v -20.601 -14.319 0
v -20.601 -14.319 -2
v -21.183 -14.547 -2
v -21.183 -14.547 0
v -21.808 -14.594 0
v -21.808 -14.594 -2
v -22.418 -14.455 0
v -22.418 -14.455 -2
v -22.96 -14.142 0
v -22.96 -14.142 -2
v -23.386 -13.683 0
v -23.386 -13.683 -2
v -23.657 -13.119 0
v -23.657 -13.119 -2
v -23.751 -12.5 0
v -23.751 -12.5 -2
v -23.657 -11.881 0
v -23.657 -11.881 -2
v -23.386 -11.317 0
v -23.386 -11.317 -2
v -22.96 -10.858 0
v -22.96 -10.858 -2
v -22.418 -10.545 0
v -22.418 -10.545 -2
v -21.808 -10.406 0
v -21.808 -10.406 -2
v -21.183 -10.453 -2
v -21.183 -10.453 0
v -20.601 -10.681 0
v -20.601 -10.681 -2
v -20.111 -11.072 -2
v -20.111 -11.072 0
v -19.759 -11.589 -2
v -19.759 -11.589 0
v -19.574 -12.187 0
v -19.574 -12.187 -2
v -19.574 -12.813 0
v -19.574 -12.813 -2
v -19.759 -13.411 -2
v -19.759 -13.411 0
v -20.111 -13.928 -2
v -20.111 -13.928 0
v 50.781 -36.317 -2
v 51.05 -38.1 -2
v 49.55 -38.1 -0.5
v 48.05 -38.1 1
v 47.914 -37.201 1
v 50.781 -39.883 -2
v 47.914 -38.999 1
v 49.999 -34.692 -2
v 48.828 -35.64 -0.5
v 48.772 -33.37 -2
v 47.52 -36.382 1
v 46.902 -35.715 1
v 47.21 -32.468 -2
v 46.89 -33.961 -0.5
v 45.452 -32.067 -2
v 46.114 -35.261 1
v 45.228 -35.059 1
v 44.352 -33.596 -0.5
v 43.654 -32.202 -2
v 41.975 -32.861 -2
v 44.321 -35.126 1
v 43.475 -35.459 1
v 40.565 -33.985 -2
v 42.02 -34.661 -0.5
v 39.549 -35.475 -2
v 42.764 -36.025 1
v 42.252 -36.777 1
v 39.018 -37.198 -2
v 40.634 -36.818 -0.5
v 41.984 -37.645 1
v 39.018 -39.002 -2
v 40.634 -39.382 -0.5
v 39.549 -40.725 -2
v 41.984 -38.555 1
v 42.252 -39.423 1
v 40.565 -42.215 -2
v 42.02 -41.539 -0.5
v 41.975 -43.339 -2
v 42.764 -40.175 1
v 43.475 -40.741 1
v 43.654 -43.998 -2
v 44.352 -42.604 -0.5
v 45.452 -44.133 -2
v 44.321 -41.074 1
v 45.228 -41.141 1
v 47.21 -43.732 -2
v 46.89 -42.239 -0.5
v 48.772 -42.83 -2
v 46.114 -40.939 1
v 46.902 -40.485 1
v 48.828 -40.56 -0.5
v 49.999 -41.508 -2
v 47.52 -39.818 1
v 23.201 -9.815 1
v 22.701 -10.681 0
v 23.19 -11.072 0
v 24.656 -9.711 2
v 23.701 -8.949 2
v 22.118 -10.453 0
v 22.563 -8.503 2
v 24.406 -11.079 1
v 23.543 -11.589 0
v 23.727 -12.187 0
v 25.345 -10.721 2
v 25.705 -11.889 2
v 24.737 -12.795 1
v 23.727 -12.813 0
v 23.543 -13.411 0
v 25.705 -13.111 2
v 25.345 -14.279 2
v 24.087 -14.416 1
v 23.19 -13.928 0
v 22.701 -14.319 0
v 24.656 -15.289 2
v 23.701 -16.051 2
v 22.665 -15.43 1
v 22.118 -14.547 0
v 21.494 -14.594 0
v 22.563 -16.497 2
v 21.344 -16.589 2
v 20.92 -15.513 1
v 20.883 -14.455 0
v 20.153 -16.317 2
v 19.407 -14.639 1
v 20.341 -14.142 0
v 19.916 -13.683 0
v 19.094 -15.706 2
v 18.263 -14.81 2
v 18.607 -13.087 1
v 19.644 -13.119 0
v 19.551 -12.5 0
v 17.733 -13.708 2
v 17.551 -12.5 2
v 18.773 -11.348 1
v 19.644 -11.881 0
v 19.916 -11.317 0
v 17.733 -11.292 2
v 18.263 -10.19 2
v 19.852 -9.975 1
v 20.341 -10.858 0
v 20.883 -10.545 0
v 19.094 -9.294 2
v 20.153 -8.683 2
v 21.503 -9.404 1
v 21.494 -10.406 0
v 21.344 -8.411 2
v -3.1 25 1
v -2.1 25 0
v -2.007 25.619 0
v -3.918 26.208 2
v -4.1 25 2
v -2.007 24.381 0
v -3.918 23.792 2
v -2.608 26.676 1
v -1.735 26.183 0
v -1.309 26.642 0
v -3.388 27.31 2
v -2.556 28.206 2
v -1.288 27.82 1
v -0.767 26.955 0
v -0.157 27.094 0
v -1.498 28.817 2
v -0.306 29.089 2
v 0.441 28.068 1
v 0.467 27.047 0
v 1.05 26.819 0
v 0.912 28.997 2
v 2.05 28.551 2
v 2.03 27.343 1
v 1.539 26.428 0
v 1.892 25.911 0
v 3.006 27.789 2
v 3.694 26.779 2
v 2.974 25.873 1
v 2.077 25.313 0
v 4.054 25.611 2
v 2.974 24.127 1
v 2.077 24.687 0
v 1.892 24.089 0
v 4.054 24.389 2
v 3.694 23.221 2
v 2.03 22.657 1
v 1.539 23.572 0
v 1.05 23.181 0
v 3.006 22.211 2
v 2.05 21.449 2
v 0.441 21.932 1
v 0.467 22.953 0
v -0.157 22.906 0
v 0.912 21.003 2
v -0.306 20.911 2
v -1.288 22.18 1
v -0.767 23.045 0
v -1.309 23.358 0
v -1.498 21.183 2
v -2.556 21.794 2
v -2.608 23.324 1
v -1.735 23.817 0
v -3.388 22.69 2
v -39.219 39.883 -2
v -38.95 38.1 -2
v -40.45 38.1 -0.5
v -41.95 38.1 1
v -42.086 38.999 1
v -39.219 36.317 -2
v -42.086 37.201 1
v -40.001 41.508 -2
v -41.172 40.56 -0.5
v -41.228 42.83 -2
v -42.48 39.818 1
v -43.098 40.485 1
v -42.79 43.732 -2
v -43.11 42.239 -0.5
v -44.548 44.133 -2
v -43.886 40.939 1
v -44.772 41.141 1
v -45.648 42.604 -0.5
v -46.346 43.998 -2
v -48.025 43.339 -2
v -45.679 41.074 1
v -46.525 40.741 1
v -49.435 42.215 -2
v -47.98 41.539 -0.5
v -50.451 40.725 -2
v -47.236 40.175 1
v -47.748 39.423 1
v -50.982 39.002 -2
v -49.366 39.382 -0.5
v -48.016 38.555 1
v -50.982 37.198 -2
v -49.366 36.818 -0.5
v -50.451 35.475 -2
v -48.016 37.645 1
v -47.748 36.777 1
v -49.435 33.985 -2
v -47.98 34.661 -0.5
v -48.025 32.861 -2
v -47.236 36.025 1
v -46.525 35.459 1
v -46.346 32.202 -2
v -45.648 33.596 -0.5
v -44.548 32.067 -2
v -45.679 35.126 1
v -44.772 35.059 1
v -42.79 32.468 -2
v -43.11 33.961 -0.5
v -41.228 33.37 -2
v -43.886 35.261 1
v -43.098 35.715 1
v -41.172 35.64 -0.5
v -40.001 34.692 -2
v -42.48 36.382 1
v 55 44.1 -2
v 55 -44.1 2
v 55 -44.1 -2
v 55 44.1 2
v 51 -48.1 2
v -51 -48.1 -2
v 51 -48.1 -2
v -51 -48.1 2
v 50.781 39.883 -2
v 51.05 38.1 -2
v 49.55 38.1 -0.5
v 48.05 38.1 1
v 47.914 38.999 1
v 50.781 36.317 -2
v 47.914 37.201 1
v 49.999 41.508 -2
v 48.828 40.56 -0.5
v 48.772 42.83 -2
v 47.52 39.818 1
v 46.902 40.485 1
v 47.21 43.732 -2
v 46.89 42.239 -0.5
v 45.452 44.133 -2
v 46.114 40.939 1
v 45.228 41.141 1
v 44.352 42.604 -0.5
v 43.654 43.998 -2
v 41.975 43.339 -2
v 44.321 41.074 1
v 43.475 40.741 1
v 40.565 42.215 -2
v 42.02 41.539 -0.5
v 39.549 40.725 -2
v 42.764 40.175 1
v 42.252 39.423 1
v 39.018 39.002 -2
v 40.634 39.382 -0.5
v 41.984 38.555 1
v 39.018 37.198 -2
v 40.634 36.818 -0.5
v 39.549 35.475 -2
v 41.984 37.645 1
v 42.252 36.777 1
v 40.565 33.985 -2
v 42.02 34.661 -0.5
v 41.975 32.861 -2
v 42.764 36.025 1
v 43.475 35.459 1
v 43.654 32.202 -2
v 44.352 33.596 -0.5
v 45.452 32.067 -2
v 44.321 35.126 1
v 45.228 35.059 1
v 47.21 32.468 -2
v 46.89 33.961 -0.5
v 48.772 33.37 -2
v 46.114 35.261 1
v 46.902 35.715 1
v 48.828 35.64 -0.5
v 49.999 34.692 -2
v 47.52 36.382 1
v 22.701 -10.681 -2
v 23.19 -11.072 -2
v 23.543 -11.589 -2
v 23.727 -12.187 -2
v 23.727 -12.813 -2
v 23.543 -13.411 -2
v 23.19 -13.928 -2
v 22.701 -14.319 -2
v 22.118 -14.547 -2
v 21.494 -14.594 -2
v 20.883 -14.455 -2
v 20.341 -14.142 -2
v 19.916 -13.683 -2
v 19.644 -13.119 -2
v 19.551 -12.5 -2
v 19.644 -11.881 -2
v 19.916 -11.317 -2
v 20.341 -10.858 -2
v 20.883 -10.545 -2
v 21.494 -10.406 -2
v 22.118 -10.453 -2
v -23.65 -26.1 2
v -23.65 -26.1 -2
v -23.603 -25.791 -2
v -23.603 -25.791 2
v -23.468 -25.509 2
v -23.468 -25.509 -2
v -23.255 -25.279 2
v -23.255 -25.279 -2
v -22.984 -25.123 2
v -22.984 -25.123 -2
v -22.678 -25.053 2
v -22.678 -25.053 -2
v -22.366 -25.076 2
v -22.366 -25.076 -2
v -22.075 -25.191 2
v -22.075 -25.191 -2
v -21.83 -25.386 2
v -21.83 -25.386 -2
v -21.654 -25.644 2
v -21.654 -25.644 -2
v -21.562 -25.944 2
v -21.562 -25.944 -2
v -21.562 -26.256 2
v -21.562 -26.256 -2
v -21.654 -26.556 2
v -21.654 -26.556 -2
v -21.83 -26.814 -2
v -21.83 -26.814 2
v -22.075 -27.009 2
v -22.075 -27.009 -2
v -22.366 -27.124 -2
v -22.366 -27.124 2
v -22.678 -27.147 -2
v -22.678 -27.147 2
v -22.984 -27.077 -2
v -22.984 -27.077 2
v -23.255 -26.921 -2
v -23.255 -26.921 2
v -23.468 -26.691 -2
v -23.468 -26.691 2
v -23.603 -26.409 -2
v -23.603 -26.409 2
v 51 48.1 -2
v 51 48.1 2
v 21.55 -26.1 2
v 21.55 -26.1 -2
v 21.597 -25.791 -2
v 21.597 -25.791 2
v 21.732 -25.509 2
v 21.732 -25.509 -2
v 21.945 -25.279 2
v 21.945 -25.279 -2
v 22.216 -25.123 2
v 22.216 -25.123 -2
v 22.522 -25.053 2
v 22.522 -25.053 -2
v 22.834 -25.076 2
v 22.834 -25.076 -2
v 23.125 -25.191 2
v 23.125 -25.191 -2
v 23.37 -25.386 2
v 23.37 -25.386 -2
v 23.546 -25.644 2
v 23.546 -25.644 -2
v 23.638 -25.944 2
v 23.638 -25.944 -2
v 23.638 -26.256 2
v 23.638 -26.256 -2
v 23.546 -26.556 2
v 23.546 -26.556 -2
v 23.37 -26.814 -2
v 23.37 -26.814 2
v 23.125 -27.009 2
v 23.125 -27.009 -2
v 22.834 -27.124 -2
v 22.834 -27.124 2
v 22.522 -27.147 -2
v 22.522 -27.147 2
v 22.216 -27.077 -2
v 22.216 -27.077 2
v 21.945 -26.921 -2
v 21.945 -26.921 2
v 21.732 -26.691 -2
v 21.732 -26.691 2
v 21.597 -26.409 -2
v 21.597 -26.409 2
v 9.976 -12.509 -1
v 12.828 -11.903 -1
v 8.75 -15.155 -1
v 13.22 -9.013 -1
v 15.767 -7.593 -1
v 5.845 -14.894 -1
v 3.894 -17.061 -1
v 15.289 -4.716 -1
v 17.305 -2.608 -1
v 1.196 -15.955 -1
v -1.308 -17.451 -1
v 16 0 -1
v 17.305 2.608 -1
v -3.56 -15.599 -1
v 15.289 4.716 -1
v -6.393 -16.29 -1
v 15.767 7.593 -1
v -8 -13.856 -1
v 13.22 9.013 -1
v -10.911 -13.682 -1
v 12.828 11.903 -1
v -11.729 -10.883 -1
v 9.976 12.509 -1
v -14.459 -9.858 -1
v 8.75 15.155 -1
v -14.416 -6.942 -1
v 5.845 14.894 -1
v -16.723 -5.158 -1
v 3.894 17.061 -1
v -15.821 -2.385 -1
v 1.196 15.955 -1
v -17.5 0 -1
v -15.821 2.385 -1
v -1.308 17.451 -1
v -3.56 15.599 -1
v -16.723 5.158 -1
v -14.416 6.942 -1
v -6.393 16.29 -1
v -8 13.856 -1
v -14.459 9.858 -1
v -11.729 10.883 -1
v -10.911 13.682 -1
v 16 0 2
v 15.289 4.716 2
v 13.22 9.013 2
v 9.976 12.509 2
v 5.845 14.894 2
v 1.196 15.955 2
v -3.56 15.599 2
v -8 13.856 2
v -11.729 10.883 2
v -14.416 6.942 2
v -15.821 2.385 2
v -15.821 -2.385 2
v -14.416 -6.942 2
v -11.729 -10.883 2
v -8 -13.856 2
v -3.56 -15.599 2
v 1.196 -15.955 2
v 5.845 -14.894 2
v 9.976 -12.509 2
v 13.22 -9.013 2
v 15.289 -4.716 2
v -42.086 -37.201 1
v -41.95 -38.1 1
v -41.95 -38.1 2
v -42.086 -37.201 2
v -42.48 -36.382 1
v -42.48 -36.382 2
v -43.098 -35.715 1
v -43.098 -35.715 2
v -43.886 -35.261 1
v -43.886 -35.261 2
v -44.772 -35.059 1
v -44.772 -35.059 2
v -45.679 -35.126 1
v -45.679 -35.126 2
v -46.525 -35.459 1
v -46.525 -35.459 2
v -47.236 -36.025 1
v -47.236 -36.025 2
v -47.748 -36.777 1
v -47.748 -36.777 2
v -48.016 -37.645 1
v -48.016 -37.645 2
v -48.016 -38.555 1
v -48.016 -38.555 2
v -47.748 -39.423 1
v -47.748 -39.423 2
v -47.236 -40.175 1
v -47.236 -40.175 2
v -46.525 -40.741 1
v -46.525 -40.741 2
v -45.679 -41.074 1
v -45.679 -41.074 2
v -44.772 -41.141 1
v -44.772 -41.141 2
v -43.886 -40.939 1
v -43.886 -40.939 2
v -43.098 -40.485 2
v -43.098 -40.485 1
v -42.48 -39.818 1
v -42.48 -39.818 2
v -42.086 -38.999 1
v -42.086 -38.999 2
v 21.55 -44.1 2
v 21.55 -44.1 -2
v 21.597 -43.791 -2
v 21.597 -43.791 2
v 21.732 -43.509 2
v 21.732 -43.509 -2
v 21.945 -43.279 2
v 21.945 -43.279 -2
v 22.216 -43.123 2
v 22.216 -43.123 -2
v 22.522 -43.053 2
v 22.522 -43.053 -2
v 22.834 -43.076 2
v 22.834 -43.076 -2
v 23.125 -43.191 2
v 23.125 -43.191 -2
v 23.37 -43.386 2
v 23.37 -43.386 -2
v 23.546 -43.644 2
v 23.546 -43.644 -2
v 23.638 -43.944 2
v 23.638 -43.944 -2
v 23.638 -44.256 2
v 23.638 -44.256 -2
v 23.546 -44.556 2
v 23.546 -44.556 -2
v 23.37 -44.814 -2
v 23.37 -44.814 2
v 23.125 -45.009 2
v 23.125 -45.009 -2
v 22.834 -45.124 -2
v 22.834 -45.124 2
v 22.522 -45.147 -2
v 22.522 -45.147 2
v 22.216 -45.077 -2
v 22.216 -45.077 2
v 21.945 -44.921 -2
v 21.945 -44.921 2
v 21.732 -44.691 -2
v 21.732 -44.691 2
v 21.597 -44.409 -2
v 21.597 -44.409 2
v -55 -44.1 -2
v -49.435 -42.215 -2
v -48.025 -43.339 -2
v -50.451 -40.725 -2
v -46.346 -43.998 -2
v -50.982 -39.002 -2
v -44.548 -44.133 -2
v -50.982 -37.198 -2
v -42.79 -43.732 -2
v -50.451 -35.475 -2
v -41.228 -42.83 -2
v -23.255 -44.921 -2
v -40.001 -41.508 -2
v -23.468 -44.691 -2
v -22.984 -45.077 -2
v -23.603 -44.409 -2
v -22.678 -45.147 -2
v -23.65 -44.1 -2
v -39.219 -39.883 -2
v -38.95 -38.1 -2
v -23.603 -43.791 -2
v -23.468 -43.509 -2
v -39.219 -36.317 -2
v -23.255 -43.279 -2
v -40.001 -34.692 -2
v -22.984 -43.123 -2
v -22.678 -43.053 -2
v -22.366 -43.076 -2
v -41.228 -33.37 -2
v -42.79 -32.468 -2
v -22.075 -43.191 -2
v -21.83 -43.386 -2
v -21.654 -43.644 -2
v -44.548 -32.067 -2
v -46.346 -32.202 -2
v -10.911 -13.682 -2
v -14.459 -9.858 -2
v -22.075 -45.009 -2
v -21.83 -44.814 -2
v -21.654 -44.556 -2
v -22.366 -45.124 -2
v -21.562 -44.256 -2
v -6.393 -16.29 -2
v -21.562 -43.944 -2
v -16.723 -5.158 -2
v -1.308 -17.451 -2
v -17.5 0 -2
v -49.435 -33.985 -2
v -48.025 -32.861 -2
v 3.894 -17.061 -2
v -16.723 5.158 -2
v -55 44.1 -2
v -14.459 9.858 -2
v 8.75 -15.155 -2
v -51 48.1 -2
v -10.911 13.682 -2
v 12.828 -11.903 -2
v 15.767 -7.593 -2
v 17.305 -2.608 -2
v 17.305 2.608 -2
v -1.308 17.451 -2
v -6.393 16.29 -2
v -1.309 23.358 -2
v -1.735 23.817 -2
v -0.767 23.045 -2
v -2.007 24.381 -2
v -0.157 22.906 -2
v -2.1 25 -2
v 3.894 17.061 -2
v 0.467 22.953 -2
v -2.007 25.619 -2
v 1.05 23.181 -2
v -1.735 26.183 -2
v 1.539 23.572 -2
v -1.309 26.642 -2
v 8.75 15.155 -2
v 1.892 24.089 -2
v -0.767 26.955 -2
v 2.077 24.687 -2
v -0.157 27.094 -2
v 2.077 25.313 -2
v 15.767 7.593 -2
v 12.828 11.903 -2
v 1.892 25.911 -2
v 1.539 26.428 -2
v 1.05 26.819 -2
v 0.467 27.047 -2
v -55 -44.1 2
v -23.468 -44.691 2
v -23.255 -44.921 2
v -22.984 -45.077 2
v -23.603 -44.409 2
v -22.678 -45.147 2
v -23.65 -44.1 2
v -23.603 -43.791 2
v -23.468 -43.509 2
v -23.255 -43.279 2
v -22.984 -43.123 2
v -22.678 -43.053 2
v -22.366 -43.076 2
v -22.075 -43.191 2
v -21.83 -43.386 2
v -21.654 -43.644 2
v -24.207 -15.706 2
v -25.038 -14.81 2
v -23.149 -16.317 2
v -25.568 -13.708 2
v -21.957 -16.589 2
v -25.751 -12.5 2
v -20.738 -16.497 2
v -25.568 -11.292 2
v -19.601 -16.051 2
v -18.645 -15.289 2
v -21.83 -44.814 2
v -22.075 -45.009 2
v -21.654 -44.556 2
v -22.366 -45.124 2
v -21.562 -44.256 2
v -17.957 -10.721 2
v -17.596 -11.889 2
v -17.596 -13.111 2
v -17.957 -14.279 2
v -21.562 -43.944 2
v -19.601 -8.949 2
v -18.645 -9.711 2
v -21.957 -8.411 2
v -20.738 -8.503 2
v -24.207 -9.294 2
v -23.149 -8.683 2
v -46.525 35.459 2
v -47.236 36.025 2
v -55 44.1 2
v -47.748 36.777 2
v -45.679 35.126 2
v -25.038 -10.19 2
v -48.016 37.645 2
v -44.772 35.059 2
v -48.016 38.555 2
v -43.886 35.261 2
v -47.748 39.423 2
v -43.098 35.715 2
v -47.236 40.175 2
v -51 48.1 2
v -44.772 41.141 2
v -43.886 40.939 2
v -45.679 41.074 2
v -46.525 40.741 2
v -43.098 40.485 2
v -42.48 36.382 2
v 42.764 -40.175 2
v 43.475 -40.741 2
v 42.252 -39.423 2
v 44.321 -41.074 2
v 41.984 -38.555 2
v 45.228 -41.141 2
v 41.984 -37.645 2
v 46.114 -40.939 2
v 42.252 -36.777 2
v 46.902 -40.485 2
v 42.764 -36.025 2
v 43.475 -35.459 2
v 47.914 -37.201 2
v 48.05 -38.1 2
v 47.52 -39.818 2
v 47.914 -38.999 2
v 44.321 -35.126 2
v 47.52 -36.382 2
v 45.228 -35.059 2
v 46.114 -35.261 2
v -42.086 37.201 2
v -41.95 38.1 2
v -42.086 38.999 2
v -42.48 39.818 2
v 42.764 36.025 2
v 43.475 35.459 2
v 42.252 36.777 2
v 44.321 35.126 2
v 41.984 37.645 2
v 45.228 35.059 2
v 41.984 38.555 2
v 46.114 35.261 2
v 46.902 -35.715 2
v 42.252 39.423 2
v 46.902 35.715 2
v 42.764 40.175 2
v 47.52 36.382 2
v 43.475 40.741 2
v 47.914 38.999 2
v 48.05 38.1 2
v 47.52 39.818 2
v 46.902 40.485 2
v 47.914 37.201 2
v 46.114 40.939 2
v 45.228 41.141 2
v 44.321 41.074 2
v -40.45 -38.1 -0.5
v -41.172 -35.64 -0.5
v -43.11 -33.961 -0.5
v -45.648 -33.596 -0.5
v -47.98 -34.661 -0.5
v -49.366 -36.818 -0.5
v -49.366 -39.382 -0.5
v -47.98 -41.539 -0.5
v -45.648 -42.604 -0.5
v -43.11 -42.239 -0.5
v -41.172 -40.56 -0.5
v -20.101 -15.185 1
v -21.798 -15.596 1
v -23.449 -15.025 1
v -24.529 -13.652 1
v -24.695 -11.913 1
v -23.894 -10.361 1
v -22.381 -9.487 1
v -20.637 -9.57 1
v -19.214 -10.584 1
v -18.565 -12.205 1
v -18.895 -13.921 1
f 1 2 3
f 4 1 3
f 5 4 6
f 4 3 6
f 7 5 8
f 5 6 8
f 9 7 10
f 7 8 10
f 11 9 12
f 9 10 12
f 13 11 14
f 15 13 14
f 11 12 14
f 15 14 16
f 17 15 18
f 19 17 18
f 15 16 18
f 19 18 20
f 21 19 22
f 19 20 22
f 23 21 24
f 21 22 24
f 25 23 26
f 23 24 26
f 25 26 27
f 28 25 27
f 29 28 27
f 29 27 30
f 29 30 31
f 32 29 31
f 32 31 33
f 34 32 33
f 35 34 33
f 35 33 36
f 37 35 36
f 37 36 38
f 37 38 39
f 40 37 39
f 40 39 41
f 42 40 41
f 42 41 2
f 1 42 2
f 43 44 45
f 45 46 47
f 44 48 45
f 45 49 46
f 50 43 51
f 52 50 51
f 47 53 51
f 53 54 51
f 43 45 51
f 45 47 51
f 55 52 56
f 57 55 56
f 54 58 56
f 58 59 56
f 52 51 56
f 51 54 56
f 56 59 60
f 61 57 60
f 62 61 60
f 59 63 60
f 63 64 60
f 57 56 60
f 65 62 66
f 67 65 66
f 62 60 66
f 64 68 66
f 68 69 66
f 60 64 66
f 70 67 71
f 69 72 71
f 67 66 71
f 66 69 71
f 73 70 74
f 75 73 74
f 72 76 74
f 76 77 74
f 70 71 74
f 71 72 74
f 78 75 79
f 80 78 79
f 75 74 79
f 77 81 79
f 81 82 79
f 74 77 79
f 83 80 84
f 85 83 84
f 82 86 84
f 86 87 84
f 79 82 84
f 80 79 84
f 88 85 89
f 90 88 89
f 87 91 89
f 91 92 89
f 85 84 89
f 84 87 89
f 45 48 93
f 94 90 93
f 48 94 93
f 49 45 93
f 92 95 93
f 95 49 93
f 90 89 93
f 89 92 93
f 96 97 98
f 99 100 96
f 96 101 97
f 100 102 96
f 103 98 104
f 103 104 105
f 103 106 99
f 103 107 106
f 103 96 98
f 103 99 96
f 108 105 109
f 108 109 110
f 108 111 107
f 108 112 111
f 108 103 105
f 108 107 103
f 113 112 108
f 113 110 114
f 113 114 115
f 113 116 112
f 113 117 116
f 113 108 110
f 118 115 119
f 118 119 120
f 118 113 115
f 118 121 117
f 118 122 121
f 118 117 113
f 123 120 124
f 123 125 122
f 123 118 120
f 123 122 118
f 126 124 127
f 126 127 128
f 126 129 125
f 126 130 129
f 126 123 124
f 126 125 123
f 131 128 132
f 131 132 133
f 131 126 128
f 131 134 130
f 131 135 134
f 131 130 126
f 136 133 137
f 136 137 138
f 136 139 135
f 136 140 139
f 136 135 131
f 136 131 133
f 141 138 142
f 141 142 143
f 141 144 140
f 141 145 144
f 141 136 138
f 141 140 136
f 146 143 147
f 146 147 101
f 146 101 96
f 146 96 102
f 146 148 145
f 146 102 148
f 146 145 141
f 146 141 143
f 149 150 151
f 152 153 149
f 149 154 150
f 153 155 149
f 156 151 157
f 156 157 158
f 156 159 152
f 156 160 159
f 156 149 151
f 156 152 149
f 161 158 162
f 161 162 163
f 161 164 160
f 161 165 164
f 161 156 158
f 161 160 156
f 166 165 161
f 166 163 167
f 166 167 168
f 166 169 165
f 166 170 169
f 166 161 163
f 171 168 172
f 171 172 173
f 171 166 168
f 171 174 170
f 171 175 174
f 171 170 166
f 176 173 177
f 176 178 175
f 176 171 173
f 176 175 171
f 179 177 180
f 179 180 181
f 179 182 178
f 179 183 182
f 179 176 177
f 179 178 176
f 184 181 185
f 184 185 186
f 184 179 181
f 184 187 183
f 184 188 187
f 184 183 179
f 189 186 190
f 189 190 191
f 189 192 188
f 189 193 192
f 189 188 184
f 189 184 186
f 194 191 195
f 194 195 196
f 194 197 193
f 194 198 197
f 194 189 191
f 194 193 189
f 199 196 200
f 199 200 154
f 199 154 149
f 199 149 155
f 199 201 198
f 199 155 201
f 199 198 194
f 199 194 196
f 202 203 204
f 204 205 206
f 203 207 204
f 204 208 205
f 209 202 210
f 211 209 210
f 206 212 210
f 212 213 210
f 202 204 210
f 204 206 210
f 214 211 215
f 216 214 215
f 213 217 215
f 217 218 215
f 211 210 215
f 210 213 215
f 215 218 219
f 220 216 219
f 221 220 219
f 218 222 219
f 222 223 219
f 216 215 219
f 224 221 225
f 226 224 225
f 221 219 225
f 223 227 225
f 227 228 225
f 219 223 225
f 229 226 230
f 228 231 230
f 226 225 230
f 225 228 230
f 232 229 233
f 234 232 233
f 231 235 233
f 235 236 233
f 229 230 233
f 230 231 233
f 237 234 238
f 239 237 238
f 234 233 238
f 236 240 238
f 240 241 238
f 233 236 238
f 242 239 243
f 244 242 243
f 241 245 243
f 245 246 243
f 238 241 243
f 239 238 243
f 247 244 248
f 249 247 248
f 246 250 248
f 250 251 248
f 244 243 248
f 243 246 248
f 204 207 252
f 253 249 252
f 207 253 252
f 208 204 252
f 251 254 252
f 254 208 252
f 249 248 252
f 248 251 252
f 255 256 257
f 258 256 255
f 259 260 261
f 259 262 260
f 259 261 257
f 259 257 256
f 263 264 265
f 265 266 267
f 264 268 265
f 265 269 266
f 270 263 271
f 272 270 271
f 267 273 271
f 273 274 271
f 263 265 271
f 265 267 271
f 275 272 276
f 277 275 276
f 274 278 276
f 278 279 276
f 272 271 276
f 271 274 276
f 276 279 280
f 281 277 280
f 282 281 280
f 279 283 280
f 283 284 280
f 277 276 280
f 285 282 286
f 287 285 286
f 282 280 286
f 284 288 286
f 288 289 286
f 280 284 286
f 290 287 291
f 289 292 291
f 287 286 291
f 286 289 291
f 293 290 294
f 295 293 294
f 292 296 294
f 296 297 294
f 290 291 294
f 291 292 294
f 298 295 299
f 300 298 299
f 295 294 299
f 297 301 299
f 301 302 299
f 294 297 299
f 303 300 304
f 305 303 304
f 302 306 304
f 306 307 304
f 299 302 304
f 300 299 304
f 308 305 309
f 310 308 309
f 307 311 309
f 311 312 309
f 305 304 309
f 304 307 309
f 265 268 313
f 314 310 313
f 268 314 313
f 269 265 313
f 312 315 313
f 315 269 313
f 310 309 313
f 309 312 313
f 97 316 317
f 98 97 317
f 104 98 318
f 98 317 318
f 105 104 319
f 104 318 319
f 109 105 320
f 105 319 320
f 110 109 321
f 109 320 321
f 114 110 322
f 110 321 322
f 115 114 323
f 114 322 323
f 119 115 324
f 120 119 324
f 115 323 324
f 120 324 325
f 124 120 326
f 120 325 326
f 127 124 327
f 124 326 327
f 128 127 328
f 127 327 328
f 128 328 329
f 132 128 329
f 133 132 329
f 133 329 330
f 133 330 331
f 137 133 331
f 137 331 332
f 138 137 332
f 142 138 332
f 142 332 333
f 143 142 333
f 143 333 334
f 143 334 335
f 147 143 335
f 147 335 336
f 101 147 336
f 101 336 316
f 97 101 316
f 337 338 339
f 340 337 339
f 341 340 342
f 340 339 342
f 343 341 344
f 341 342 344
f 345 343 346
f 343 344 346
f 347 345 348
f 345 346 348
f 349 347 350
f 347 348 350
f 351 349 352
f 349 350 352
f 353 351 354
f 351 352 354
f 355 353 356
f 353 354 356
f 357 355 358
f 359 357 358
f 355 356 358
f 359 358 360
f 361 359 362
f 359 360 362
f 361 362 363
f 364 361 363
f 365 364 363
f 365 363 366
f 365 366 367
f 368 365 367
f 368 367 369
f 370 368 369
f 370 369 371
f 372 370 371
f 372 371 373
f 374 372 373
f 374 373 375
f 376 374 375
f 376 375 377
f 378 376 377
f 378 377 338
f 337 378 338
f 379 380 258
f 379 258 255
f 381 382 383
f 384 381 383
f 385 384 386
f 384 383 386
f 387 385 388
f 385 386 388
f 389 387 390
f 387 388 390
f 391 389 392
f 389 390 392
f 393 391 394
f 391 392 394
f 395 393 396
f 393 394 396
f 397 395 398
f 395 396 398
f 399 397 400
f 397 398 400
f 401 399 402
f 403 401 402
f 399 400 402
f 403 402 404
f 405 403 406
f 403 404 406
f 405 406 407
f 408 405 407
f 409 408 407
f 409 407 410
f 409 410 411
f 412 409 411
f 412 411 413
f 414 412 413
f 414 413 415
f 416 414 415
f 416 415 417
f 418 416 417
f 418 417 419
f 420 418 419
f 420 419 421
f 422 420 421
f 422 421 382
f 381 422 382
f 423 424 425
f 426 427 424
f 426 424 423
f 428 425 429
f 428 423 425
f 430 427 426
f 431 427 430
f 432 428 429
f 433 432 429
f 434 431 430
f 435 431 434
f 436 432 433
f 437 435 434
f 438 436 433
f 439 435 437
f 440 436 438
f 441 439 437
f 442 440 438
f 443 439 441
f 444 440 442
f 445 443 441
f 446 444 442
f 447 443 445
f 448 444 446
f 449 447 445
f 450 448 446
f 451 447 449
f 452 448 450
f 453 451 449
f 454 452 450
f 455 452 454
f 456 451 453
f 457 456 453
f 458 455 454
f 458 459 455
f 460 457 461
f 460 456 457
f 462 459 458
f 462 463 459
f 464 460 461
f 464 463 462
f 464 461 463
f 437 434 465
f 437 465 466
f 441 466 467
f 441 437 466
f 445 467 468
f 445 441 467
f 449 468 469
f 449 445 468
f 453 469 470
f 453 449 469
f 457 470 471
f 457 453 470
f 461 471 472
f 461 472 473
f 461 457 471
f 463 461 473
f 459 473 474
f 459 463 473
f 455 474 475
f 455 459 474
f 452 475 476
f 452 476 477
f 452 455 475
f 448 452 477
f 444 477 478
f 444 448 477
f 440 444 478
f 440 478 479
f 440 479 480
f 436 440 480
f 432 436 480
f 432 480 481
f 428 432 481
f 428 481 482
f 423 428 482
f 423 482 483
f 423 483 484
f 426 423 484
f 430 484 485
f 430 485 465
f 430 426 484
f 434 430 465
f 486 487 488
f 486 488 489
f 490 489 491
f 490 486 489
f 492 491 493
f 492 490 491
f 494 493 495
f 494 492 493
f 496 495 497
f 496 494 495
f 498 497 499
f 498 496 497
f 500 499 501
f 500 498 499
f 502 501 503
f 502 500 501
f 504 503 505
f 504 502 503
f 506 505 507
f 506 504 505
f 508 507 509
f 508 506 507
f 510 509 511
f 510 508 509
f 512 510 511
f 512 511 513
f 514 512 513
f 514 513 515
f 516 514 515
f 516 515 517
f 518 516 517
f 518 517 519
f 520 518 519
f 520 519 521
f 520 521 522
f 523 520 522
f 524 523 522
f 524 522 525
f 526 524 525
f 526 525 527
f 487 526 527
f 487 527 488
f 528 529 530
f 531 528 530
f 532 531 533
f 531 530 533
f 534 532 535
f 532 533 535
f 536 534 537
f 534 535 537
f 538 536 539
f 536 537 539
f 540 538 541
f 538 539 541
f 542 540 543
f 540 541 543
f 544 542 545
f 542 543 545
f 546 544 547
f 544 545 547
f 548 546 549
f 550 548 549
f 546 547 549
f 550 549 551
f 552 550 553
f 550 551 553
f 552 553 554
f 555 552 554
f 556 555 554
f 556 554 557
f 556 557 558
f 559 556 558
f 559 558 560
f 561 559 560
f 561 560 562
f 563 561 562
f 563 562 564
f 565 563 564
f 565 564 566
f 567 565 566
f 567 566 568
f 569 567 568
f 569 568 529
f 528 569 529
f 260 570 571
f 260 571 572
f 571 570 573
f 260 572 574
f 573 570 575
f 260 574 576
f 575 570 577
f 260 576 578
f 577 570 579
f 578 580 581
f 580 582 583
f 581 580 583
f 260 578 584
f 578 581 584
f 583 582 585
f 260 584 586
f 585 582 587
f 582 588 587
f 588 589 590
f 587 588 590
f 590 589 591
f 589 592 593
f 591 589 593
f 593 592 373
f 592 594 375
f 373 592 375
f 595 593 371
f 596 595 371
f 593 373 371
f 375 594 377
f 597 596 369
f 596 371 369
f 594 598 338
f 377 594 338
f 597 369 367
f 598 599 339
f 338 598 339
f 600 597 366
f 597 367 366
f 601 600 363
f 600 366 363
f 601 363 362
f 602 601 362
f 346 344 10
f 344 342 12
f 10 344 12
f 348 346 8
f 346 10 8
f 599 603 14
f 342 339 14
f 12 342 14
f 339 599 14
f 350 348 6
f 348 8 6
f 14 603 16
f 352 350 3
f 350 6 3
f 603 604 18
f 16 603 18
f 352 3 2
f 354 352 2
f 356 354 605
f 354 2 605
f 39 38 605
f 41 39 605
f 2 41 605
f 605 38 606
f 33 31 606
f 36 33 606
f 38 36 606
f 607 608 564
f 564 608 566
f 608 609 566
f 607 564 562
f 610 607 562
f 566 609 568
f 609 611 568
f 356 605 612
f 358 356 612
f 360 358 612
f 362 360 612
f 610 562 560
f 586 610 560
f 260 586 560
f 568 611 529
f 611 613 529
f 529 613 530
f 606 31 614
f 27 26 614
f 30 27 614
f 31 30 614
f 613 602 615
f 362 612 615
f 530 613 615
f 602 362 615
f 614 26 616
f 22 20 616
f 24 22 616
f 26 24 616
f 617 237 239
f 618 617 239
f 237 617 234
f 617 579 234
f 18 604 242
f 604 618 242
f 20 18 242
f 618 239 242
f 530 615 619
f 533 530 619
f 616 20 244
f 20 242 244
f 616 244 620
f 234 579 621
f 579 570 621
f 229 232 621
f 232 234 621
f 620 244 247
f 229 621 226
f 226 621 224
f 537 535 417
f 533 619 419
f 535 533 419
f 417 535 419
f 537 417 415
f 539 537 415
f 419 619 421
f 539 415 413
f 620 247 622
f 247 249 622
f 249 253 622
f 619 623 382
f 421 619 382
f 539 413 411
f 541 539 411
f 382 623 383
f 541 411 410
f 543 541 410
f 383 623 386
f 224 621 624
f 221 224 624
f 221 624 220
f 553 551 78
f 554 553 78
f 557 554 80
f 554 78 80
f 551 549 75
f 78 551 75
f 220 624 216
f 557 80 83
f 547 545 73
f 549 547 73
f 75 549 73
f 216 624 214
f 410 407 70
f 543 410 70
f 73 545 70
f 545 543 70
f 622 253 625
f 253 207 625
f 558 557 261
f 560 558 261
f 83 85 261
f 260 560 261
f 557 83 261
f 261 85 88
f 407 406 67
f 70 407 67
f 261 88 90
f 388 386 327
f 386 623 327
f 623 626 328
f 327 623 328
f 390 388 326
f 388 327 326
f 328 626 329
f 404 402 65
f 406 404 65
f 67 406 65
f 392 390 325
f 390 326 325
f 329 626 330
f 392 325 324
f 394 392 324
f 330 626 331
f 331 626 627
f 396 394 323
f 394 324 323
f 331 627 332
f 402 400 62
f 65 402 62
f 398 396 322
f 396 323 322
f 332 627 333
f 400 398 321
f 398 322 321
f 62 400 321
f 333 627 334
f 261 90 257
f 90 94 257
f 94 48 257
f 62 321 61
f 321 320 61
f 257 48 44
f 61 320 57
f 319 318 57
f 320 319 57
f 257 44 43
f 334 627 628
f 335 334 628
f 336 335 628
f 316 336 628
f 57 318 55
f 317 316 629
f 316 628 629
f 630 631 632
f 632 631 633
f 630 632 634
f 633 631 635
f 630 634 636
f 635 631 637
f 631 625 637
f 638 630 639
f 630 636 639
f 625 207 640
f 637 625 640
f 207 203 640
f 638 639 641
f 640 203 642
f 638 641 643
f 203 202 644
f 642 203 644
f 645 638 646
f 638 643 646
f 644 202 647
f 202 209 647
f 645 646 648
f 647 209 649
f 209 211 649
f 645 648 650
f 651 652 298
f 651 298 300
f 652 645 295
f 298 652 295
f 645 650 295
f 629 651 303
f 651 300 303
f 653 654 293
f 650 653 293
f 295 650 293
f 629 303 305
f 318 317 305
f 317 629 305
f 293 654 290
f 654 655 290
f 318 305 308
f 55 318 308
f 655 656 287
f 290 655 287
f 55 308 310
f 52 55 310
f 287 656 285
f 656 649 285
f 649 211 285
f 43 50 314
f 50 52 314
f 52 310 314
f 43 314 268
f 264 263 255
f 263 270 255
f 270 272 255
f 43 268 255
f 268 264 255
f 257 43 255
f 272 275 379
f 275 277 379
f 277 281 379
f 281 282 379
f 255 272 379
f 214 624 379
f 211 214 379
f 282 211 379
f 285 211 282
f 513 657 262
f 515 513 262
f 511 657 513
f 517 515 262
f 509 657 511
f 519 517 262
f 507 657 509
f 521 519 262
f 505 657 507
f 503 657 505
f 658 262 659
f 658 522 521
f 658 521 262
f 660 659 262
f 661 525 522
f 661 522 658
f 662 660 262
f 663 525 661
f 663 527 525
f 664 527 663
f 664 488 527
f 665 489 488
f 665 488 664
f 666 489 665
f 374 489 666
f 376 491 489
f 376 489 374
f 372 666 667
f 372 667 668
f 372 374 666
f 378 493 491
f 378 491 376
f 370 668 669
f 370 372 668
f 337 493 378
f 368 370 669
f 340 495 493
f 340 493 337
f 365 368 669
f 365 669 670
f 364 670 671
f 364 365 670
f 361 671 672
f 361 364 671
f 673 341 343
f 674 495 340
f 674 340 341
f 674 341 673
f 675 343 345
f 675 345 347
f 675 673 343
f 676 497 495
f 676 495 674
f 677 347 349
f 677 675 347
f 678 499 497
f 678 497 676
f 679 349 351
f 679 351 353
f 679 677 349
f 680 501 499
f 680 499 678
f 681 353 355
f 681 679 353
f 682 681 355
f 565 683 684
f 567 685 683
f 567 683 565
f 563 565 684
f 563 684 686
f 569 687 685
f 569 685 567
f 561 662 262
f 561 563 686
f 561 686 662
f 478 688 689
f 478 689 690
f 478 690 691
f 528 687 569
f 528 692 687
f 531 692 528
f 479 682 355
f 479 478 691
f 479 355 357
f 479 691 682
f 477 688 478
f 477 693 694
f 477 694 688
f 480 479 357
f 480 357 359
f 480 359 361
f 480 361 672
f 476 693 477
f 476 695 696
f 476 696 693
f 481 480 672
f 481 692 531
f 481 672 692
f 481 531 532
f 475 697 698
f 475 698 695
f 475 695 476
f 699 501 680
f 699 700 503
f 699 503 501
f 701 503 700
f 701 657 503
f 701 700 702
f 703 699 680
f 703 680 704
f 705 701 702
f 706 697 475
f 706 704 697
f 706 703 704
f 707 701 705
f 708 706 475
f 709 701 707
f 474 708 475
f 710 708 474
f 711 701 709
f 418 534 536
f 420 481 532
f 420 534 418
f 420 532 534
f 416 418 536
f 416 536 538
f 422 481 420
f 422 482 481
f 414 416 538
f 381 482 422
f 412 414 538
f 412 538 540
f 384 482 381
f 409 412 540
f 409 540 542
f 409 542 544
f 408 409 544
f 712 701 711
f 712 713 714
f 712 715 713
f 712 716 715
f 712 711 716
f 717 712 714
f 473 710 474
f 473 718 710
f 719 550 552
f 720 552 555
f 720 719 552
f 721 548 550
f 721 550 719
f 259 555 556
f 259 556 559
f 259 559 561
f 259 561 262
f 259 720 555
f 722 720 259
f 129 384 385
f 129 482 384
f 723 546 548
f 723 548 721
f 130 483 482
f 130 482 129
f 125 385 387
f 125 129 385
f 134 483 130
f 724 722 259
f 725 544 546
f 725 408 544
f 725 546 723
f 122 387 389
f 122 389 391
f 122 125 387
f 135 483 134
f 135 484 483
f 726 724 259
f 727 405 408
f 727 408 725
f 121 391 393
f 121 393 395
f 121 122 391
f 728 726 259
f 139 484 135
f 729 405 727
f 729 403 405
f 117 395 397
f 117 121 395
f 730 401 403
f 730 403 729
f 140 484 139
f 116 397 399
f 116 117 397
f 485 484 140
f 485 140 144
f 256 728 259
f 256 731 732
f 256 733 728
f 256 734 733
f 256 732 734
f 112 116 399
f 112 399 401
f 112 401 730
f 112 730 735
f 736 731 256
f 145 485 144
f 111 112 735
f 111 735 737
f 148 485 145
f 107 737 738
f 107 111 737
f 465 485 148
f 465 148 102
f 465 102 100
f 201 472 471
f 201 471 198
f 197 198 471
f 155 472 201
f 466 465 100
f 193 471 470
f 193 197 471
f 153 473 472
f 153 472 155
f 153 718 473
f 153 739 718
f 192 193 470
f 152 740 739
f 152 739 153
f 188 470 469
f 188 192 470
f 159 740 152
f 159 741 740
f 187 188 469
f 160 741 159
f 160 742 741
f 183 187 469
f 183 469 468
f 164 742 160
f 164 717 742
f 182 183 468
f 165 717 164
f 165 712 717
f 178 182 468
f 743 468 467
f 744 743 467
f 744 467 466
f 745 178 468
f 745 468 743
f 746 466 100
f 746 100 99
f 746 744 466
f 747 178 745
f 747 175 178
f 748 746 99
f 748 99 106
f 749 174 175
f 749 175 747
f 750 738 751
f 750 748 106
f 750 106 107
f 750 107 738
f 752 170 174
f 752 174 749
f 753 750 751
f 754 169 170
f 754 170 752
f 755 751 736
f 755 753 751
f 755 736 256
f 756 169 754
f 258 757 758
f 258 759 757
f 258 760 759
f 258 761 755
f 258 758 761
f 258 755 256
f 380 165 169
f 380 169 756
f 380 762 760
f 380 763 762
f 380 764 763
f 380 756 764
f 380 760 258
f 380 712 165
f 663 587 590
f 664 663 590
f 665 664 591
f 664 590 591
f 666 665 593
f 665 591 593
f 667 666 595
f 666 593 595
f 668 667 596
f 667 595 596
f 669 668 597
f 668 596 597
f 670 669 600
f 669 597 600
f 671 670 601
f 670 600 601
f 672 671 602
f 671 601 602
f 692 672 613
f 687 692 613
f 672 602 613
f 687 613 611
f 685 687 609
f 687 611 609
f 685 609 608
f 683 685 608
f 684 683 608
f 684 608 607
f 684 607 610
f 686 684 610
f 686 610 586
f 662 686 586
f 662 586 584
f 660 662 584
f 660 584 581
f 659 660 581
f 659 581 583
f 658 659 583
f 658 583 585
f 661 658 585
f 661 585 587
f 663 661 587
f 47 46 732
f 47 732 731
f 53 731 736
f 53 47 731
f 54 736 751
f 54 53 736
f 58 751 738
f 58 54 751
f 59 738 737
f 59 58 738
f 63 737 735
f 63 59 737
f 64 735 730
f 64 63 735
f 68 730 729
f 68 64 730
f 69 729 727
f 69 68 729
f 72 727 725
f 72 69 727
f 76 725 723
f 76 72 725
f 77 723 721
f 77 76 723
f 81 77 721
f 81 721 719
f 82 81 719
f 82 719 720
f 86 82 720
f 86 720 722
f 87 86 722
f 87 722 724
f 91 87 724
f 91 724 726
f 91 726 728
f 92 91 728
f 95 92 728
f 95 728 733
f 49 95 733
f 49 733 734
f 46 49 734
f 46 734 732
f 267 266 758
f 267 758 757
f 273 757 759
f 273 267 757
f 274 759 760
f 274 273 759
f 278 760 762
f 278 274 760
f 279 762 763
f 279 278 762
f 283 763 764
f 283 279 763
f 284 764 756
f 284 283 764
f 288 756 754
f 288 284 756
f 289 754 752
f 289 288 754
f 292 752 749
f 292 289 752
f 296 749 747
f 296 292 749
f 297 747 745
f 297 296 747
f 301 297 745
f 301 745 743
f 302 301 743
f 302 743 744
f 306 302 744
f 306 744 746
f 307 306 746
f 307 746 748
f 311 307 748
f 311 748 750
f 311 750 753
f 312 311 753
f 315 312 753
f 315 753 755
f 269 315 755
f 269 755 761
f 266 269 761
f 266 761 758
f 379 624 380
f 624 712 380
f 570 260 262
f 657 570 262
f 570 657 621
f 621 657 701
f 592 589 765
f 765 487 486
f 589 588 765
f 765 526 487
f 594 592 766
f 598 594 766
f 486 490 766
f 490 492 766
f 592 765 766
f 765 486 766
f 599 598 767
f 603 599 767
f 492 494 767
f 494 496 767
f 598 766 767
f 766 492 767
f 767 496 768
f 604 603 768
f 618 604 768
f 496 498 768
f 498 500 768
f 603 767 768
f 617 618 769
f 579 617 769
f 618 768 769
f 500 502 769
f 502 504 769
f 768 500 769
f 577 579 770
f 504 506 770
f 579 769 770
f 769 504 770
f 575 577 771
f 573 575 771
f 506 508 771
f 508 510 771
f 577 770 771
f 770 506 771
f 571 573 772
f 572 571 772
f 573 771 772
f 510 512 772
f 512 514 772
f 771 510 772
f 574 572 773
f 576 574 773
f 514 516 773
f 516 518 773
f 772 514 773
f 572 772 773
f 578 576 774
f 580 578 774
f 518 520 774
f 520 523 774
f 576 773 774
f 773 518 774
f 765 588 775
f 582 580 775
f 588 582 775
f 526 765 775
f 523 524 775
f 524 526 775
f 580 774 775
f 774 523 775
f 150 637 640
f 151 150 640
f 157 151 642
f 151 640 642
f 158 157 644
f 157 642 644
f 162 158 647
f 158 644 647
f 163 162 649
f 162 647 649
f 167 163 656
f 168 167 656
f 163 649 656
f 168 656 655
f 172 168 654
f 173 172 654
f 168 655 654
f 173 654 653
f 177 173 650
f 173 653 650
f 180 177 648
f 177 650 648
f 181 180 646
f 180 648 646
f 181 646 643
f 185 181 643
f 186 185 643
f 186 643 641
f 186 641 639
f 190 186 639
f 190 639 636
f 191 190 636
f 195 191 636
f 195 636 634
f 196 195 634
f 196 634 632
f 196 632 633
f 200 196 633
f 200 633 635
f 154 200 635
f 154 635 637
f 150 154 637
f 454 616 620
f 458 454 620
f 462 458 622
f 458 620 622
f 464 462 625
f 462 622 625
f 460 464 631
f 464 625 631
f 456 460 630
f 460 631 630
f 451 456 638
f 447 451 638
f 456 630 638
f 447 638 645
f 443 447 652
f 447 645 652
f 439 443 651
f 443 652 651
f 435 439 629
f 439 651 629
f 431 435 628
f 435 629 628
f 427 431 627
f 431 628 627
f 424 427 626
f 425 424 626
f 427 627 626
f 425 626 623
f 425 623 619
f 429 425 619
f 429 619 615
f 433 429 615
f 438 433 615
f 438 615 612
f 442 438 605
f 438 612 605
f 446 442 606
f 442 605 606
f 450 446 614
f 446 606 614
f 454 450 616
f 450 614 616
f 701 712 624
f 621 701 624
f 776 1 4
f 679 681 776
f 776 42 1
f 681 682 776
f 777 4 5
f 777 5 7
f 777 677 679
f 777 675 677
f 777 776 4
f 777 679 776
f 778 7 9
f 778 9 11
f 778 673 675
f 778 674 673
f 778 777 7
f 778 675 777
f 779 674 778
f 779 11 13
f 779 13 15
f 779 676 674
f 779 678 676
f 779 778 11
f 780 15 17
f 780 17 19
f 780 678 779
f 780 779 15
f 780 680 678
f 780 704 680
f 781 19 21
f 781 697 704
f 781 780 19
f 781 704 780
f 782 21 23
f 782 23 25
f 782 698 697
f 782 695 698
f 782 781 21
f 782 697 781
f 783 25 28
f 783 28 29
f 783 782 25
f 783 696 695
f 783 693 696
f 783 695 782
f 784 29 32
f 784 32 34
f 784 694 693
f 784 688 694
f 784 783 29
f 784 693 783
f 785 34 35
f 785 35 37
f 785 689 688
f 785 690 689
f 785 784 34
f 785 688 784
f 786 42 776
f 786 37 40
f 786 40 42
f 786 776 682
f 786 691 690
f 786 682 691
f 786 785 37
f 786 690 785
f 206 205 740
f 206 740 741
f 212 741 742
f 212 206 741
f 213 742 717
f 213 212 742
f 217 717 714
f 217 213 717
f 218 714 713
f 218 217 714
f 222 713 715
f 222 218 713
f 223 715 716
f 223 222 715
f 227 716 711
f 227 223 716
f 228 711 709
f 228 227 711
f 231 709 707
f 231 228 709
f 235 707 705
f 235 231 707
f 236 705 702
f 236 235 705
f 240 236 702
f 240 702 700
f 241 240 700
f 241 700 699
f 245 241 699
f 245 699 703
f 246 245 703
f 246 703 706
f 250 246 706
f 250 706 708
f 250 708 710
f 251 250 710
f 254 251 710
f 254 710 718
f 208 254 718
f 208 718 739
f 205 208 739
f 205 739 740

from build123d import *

# Parameters (mm, degrees)
SKETCH_1_W               = 110
SKETCH_1_H               = 96.2
SKETCH_1_R               = 3.05
SKETCH_1_R_2             = 16
EXTRUDE_1_DEPTH          = 2
CHAMFER_1_SIZE           = 4
CHAMFER_2_SIZE           = 3
SKETCH_2_R               = 17.5
CUT_EXTRUDE_1_DEPTH      = 1
SKETCH_3_R               = 2.1
CUT_EXTRUDE_2_DEPTH      = 74.175200717
PATTERN_CIRCULAR_1_COUNT = 3
CHAMFER_3_SIZE           = 2
SKETCH_4_R               = 1.05
CUT_EXTRUDE_3_DEPTH      = 74.175200717


with BuildPart() as part:
    # 草图1 → 凸台-拉伸1 (new, symmetric)
    with BuildSketch(Plane.XY):
        Rectangle(SKETCH_1_W, SKETCH_1_H)
        with Locations((-45, 38.1)):
            Circle(SKETCH_1_R, mode=Mode.SUBTRACT)
        with Locations((-45, -38.1)):
            Circle(SKETCH_1_R, mode=Mode.SUBTRACT)
        with Locations((45, -38.1)):
            Circle(SKETCH_1_R, mode=Mode.SUBTRACT)
        with Locations((45, 38.1)):
            Circle(SKETCH_1_R, mode=Mode.SUBTRACT)
        Circle(SKETCH_1_R_2, mode=Mode.SUBTRACT)
    extrude(amount=EXTRUDE_1_DEPTH, both=True)

    # 倒角1
    chamfer_1_edges = [part.edges().sort_by_distance(p)[0] for p in [
        (-55, 48.1, 0),
        (55, 48.1, 0),
        (55, -48.1, 0),
        (-55, -48.1, 0),
    ]]
    chamfer(chamfer_1_edges, length=CHAMFER_1_SIZE)

    # 倒角2
    chamfer_2_edges = [part.edges().sort_by_distance(p)[0] for p in [
        (-48.05, 38.1, -2),
        (-48.05, -38.1, -2),
        (41.95, -38.1, -2),
        (41.95, 38.1, -2),
    ]]
    chamfer(chamfer_2_edges, length=CHAMFER_2_SIZE)

    # 草图2 → 切除-拉伸1 (cut)
    with BuildSketch(Plane(origin=(0, 0, -2), x_dir=(-1, 0, 0), z_dir=(0, 0, -1))):
        Circle(SKETCH_2_R)
    extrude(amount=-CUT_EXTRUDE_1_DEPTH, mode=Mode.SUBTRACT)

    # 草图3 → 切除-拉伸2 (cut, through all)
    with BuildSketch(Plane(origin=(0, 0, -2), x_dir=(-1, 0, 0), z_dir=(0, 0, -1))):
        with Locations((0, 25)):
            Circle(SKETCH_3_R)
    cut_extrude_2 = extrude(amount=-CUT_EXTRUDE_2_DEPTH, mode=Mode.SUBTRACT)

    # 阵列(圆周)1: 切除-拉伸2 ×3 about axis
    pattern_circular_1_axis = Axis((0, 0, 0), (0, 0, 1))
    for i in range(1, PATTERN_CIRCULAR_1_COUNT):
        add(cut_extrude_2.rotate(pattern_circular_1_axis, i * 360 / PATTERN_CIRCULAR_1_COUNT), mode=Mode.SUBTRACT)

    # 倒角3
    chamfer_3_edges = [part.edges().sort_by_distance(p)[0] for p in [
        (2.1, 25, 2),
        (-22.700635095, -10.681346652, 2),
        (20.600635095, -14.318653348, 2),
    ]]
    chamfer(chamfer_3_edges, length=CHAMFER_3_SIZE)

    # 草图4 → 切除-拉伸3 (cut, through all)
    with BuildSketch(Plane(origin=(0, 0, -2), x_dir=(-1, 0, 0), z_dir=(0, 0, -1))):
        with Locations((-22.6, -26.1)):
            Circle(SKETCH_4_R)
        with Locations((-22.6, -44.1)):
            Circle(SKETCH_4_R)
        with Locations((22.6, -26.1)):
            Circle(SKETCH_4_R)
        with Locations((22.6, -44.1)):
            Circle(SKETCH_4_R)
    extrude(amount=-CUT_EXTRUDE_3_DEPTH, mode=Mode.SUBTRACT)


solid = part.part
